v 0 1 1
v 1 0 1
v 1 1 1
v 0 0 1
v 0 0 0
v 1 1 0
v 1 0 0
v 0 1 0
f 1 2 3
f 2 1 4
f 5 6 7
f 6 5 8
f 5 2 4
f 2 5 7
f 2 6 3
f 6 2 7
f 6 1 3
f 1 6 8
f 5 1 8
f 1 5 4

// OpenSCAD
// Volume: 1, SurfaceArea: 6
minkowski() {
    intersection() {
        translate([-2,0,0]) cube(1);
        translate([2,0,0]) cube(1);
    }
    cube();
}
